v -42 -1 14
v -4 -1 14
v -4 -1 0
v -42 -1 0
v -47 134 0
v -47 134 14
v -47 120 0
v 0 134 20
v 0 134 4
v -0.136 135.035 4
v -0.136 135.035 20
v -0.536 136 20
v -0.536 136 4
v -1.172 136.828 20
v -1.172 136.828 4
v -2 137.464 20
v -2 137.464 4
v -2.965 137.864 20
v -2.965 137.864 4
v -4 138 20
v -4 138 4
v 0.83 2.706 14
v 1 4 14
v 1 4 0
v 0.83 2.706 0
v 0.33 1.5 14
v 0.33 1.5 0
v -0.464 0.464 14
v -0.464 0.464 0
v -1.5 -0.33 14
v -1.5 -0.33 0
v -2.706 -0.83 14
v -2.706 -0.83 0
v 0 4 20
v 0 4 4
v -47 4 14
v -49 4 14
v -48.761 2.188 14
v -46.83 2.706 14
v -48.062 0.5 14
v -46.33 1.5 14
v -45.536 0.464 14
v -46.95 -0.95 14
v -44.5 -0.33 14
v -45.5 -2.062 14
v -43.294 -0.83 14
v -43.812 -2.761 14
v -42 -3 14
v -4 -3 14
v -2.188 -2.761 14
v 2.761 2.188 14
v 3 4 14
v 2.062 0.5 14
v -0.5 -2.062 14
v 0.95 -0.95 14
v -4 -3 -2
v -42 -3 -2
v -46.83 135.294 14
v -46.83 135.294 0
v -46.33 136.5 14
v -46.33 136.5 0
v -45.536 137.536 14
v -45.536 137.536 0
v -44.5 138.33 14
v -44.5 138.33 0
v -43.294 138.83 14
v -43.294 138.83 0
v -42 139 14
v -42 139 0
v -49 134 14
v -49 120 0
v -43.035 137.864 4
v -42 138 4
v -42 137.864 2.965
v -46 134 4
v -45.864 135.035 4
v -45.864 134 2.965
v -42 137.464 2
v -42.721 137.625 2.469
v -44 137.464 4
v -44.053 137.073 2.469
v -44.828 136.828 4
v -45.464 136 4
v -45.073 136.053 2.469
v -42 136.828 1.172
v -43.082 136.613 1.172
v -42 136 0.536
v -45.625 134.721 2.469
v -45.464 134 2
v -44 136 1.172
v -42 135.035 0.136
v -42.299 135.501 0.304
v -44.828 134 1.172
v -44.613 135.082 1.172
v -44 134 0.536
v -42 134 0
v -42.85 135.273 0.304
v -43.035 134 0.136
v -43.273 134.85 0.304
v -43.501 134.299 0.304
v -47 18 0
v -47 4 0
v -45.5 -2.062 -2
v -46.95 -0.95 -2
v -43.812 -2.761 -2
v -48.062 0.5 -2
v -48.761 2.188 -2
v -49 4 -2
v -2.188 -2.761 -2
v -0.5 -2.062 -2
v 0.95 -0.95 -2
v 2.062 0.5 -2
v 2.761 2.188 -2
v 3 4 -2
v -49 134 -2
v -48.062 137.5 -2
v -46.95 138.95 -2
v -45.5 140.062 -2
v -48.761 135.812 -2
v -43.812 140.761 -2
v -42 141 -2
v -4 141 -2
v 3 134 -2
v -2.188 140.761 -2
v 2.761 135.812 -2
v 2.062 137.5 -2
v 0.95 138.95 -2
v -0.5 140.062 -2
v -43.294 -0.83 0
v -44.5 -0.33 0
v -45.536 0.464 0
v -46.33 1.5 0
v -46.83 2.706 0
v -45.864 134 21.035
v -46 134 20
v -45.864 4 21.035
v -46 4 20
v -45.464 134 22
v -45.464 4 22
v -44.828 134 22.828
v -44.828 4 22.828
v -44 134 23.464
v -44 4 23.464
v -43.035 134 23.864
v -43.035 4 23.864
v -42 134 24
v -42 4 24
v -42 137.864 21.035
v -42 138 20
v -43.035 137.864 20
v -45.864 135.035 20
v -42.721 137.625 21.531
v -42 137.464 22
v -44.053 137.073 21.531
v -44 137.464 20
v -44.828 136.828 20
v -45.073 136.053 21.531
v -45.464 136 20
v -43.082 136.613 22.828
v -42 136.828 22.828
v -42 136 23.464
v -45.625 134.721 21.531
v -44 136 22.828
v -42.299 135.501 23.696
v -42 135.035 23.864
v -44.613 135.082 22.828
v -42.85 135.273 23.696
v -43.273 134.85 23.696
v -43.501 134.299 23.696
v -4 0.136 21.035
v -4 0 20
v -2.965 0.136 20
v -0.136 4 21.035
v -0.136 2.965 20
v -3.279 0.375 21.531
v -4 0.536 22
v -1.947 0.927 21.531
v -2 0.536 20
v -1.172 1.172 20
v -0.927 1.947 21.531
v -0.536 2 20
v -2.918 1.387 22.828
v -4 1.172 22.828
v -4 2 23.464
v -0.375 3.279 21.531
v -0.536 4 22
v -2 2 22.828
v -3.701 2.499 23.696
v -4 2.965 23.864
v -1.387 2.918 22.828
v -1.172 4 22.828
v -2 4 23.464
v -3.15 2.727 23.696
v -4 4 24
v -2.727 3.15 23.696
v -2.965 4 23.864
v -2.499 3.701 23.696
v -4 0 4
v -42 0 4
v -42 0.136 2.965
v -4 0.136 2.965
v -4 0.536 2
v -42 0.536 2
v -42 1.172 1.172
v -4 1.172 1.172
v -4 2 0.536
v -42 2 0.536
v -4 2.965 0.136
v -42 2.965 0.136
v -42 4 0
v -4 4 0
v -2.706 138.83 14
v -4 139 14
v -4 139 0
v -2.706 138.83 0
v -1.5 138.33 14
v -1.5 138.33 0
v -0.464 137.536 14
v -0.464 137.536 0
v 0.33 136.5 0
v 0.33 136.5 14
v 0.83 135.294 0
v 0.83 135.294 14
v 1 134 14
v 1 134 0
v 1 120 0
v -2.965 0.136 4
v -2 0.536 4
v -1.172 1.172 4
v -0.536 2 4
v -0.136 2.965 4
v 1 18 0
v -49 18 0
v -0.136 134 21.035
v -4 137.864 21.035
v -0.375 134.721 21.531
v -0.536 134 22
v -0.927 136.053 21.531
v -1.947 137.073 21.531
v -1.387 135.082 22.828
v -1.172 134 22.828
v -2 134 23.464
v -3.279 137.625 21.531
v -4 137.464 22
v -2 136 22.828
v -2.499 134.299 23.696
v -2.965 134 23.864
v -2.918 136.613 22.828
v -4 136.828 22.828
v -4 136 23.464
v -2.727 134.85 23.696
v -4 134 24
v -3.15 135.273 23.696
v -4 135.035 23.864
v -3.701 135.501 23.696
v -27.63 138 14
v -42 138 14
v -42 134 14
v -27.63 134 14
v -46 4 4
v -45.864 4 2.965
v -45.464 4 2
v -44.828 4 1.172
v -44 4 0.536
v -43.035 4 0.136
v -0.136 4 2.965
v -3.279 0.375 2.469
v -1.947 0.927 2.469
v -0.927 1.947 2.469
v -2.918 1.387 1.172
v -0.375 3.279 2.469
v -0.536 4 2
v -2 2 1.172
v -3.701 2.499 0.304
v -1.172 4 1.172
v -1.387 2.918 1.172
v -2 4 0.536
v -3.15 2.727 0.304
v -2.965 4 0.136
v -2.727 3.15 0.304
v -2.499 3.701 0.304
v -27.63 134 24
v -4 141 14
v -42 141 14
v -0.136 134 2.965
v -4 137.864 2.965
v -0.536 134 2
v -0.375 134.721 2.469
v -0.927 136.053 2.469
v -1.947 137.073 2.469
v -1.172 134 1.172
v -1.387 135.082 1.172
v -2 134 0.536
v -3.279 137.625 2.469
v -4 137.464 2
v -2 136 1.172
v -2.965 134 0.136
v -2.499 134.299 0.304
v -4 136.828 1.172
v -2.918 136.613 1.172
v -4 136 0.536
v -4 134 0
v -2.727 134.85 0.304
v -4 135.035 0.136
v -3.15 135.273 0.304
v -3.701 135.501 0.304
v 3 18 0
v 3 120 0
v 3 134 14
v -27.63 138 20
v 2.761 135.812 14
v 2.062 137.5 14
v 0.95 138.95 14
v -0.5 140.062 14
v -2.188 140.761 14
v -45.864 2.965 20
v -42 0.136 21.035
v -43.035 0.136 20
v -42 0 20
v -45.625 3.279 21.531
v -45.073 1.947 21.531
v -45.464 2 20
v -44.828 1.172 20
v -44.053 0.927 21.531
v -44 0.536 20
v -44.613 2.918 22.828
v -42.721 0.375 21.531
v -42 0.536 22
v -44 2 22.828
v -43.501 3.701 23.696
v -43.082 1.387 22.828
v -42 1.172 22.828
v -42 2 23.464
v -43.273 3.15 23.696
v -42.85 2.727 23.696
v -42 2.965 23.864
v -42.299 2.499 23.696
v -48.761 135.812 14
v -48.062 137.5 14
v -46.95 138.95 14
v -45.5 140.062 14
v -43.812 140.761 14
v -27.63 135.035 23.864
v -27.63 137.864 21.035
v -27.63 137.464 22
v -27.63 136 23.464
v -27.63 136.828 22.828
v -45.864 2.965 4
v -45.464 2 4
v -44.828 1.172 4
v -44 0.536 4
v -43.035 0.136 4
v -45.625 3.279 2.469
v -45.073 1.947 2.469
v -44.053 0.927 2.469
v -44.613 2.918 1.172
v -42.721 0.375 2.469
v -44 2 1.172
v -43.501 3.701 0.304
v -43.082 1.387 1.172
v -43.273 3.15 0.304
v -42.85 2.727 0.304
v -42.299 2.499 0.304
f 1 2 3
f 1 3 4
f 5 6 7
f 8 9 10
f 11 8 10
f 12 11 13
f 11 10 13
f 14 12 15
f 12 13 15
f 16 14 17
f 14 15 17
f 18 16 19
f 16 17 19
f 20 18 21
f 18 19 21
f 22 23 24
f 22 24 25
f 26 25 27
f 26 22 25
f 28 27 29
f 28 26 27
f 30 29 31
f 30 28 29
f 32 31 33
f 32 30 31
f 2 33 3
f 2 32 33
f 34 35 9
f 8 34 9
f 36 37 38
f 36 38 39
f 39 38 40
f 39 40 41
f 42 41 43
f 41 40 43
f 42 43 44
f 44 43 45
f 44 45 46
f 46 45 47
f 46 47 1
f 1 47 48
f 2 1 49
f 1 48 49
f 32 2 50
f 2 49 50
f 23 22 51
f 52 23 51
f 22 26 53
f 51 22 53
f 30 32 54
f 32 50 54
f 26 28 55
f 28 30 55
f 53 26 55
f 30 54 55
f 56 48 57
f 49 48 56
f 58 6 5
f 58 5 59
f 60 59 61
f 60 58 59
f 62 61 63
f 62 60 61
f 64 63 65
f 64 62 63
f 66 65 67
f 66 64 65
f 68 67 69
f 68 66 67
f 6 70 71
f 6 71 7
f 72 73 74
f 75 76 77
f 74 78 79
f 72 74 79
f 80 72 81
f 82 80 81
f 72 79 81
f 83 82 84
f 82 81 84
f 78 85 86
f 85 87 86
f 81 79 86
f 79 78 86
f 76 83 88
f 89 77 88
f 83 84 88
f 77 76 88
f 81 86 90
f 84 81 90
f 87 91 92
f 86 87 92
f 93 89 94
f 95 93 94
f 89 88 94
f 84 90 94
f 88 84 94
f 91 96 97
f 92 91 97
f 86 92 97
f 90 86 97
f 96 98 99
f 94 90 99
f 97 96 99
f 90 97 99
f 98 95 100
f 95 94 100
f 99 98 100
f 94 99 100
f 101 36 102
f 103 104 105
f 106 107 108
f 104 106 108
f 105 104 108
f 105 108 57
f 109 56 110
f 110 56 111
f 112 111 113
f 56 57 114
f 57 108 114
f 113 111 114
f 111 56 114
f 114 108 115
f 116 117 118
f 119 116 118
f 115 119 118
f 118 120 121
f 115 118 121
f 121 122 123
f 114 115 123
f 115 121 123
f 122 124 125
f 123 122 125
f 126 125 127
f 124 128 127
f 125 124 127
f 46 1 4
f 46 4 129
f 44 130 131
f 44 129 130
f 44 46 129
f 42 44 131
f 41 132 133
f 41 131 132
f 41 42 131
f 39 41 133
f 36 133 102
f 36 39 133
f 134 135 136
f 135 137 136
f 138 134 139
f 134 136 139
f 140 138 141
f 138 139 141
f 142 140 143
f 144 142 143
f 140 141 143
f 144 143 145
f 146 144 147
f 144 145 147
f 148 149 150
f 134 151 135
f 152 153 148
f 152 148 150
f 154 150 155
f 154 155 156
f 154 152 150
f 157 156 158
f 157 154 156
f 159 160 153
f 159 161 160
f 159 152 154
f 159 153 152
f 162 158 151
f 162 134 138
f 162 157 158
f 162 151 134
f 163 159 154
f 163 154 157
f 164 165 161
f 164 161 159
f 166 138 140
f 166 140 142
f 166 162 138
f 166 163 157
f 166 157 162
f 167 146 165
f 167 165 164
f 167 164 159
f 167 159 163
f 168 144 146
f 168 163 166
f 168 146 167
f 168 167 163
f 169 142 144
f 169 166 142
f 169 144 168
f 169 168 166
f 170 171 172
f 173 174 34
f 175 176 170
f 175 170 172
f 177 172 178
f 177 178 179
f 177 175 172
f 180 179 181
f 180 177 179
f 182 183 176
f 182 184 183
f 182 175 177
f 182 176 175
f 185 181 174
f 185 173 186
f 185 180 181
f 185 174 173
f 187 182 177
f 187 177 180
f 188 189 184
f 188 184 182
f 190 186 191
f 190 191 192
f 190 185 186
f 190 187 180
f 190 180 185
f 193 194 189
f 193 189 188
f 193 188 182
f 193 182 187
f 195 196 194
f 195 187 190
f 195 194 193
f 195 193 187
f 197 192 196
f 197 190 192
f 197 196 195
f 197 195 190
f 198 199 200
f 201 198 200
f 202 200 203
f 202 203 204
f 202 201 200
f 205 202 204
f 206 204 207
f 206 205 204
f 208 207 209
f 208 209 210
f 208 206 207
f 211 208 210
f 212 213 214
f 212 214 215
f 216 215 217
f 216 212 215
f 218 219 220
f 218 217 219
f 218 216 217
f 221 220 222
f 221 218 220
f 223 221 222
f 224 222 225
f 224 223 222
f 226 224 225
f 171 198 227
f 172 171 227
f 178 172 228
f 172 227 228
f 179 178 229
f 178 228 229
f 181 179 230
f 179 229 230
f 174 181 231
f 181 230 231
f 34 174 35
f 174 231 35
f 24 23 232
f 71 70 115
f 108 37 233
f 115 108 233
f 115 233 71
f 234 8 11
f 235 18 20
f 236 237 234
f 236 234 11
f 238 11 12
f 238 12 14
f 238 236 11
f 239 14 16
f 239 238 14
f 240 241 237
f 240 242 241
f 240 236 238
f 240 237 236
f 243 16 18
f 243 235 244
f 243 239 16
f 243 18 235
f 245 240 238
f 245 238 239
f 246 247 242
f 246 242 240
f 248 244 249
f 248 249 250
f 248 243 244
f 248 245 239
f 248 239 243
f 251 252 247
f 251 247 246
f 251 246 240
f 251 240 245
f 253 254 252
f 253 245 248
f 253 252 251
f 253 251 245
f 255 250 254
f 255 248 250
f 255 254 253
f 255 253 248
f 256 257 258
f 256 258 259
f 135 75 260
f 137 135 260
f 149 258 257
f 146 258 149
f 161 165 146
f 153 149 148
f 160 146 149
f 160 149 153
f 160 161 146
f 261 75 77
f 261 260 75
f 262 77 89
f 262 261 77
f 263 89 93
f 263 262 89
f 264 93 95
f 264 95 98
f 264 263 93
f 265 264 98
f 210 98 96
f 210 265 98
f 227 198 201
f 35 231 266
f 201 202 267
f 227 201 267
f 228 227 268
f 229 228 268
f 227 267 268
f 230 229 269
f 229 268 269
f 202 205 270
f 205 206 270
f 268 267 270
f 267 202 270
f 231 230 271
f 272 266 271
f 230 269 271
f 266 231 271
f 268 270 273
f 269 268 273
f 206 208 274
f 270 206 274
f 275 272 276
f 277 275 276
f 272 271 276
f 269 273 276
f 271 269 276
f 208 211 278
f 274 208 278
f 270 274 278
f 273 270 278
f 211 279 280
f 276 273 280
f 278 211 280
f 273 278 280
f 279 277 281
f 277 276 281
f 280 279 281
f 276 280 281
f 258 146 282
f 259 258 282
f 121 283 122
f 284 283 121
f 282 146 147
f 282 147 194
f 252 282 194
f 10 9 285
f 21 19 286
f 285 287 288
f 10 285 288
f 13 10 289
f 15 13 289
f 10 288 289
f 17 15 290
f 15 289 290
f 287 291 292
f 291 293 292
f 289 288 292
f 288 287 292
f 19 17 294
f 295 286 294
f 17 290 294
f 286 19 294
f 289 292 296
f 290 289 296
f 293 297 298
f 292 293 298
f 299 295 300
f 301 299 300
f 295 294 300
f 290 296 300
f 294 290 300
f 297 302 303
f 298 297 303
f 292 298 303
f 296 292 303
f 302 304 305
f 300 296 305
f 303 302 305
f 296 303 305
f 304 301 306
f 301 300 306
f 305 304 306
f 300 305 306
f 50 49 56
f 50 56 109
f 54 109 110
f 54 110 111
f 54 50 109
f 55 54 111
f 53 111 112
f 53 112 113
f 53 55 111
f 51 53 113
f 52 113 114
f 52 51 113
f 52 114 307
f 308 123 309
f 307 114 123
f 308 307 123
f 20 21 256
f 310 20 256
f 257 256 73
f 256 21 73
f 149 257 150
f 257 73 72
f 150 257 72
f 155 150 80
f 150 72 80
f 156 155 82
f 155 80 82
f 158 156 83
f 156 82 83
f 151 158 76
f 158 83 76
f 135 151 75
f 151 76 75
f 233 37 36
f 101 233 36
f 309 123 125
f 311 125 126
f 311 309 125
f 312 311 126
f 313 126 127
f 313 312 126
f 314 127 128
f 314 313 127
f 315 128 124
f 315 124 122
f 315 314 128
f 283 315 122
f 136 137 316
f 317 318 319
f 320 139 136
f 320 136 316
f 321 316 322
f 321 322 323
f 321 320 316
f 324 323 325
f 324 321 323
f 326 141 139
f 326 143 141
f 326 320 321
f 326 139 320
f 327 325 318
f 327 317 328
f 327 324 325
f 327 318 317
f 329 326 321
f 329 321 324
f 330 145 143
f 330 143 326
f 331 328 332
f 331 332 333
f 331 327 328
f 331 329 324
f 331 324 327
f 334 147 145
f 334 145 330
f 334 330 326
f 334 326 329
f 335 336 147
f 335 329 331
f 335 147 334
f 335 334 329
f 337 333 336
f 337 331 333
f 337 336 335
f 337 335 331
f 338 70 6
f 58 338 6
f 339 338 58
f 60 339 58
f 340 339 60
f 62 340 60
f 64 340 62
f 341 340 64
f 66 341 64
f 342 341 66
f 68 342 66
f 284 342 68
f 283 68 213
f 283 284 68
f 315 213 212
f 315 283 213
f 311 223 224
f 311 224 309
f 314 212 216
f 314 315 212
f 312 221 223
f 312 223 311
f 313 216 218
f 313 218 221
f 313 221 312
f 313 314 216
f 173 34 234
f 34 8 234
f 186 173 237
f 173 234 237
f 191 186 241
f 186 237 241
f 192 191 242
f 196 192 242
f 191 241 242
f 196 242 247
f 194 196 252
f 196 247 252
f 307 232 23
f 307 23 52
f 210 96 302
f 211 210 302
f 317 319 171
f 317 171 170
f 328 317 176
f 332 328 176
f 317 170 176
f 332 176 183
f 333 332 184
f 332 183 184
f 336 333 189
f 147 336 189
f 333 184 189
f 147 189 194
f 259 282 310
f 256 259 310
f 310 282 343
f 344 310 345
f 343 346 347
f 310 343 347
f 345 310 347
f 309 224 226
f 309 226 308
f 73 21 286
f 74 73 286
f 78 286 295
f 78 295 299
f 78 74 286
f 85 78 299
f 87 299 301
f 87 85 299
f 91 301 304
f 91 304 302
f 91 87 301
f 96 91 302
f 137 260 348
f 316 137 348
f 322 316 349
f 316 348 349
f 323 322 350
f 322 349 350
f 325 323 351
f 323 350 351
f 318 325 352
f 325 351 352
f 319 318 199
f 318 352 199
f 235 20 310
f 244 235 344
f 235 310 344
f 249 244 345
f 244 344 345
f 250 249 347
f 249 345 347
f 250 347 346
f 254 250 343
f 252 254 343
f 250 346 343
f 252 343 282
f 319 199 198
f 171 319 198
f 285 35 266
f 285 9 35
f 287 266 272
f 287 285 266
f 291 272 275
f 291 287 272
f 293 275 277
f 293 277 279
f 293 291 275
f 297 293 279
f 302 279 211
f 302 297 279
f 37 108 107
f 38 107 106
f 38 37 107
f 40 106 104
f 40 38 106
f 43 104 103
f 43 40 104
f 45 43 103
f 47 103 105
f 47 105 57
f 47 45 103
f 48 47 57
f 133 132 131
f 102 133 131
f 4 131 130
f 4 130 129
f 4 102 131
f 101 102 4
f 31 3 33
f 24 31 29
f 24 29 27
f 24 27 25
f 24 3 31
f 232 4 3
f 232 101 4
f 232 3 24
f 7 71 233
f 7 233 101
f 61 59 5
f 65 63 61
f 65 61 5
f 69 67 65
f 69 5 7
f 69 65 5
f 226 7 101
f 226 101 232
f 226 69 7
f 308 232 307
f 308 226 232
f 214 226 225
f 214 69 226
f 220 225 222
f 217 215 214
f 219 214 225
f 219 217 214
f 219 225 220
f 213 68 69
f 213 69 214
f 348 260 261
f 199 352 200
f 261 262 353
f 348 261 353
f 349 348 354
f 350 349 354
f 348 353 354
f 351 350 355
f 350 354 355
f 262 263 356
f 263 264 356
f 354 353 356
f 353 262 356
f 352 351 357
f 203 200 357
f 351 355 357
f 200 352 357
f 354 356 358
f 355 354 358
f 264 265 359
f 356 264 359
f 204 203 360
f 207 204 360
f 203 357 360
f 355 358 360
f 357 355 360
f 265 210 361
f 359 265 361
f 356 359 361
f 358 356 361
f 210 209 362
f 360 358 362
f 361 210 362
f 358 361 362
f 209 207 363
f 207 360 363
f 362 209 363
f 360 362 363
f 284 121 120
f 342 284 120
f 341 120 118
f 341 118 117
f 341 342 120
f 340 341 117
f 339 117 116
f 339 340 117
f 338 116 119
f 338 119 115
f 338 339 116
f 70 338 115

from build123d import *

# Parameters (mm, degrees)
F1_DEPTH  = 24
F2_R      = 4
F3_W      = 14.3697379231
F3_H      = 4.1815820932
F4_DEPTH  = 10
F5_DEPTH  = 14
F6_DEPTH  = 2
F7_DEPTH  = 2
F8_W      = 2
F8_H      = 130
F9_DEPTH  = 14
F10_DEPTH = 14
F11_DEPTH = 14
F12_SIZE  = 13.99999


# Not quite as in the source:
# - a fillet or chamfer is up to 0.001 mm smaller than in the source, because OpenCascade refuses the exact size


with BuildPart() as f1:
    # F0 (on Top) → F1 (new body)
    with BuildSketch(Plane.XY):
        with BuildLine():
            Line((-42, 0), (-4, 0))
            ThreePointArc((-4, 0), (-1.1715728753, 1.1715728753), (0, 4))
            Line((0, 4), (0, 134))
            ThreePointArc((0, 134), (-1.1715728753, 136.8284271247), (-4, 138))
            Line((-4, 138), (-42, 138))
            ThreePointArc((-42, 138), (-44.8284271247, 136.8284271247), (-46, 134))
            Line((-46, 134), (-46, 4))
            ThreePointArc((-46, 4), (-44.8284271247, 1.1715728753), (-42, 0))
        make_face()
    extrude(amount=F1_DEPTH)

    # F2
    f2_edges = [f1.edges().sort_by_distance(p)[0] for p in [
        (-46, 69, 24),
        (-44.828427, 1.171573, 24),
        (-23, 0, 24),
        (-1.171573, 1.171573, 24),
        (0, 69, 24),
        (-1.171573, 136.828427, 24),
        (-23, 138, 24),
        (-44.828427, 136.828427, 24),
        (-46, 69, 0),
        (-44.828427, 1.171573, 0),
        (-23, 0, 0),
        (-1.171573, 1.171573, 0),
        (0, 69, 0),
        (-1.171573, 136.828427, 0),
        (-23, 138, 0),
        (-44.828427, 136.828427, 0),
    ]]
    fillet(f2_edges, radius=F2_R)

    # F3 (on face) → F4 (cut)
    with BuildSketch(Plane.XY.offset(24)):
        with Locations((-34.8151310384, 136.0907910466)):
            Rectangle(F3_W, F3_H)
    extrude(amount=-F4_DEPTH, mode=Mode.SUBTRACT)


with BuildPart() as f5:
    # F0 (on Top) → F5 (new body)
    with BuildSketch(Plane.XY):
        with BuildLine():
            Line((-42, -3), (-4, -3))
            ThreePointArc((-4, -3), (0.9497474683, -0.9497474683), (3, 4))
            Line((3, 4), (3, 134))
            ThreePointArc((3, 134), (0.9497474683, 138.9497474683), (-4, 141))
            Line((-4, 141), (-42, 141))
            ThreePointArc((-42, 141), (-46.9497474683, 138.9497474683), (-49, 134))
            Line((-49, 134), (-49, 4))
            ThreePointArc((-49, 4), (-46.9497474683, -0.9497474683), (-42, -3))
        make_face()
        with BuildLine():
            ThreePointArc((-42, -1), (-45.5355339059, 0.4644660941), (-47, 4))
            Line((-47, 4), (-47, 134))
            ThreePointArc((-47, 134), (-45.5355339059, 137.5355339059), (-42, 139))
            Line((-42, 139), (-4, 139))
            ThreePointArc((-4, 139), (-0.4644660941, 137.5355339059), (1, 134))
            Line((1, 134), (1, 4))
            ThreePointArc((1, 4), (-0.4644660941, 0.4644660941), (-4, -1))
            Line((-4, -1), (-42, -1))
        make_face(mode=Mode.SUBTRACT)
    extrude(amount=F5_DEPTH)



with BuildPart() as f6:
    # F0 (on Top) → F6 (new body)
    with BuildSketch(Plane.XY):
        with BuildLine():
            Line((-42, -3), (-4, -3))
            ThreePointArc((-4, -3), (0.9497474683, -0.9497474683), (3, 4))
            Line((3, 4), (3, 134))
            ThreePointArc((3, 134), (0.9497474683, 138.9497474683), (-4, 141))
            Line((-4, 141), (-42, 141))
            ThreePointArc((-42, 141), (-46.9497474683, 138.9497474683), (-49, 134))
            Line((-49, 134), (-49, 4))
            ThreePointArc((-49, 4), (-46.9497474683, -0.9497474683), (-42, -3))
        make_face()
        with BuildLine():
            ThreePointArc((-42, -1), (-45.5355339059, 0.4644660941), (-47, 4))
            Line((-47, 4), (-47, 134))
            ThreePointArc((-47, 134), (-45.5355339059, 137.5355339059), (-42, 139))
            Line((-42, 139), (-4, 139))
            ThreePointArc((-4, 139), (-0.4644660941, 137.5355339059), (1, 134))
            Line((1, 134), (1, 4))
            ThreePointArc((1, 4), (-0.4644660941, 0.4644660941), (-4, -1))
            Line((-4, -1), (-42, -1))
        make_face(mode=Mode.SUBTRACT)
    extrude(amount=-F6_DEPTH)


with BuildPart() as f6b:
    # F0 (on Top) → F6, piece 2 (new body)
    with BuildSketch(Plane.XY):
        with BuildLine():
            Line((-42, 0), (-4, 0))
            ThreePointArc((-4, 0), (-1.1715728753, 1.1715728753), (0, 4))
            Line((0, 4), (0, 134))
            ThreePointArc((0, 134), (-1.1715728753, 136.8284271247), (-4, 138))
            Line((-4, 138), (-42, 138))
            ThreePointArc((-42, 138), (-44.8284271247, 136.8284271247), (-46, 134))
            Line((-46, 134), (-46, 4))
            ThreePointArc((-46, 4), (-44.8284271247, 1.1715728753), (-42, 0))
        make_face()
    extrude(amount=-F6_DEPTH)


with BuildPart() as f5_1:
    add(f5.part)

    add(f6.part)  # F7 merges F6

    add(f6b.part)  # F7 merges F6b
    # F0 (on Top) → F7 (join)
    with BuildSketch(Plane.XY):
        with BuildLine():
            Line((-47, 134), (-47, 4))
            ThreePointArc((-47, 4), (-45.5355339059, 0.4644660941), (-42, -1))
            Line((-42, -1), (-4, -1))
            ThreePointArc((-4, -1), (-0.4644660941, 0.4644660941), (1, 4))
            Line((1, 4), (1, 134))
            ThreePointArc((1, 134), (-0.4644660941, 137.5355339059), (-4, 139))
            Line((-4, 139), (-42, 139))
            ThreePointArc((-42, 139), (-45.5355339059, 137.5355339059), (-47, 134))
        make_face()
        with BuildLine():
            ThreePointArc((0, 4), (-1.1715728753, 1.1715728753), (-4, 0))
            Line((-4, 0), (-42, 0))
            ThreePointArc((-42, 0), (-44.8284271247, 1.1715728753), (-46, 4))
            Line((-46, 4), (-46, 134))
            ThreePointArc((-46, 134), (-44.8284271247, 136.8284271247), (-42, 138))
            Line((-42, 138), (-4, 138))
            ThreePointArc((-4, 138), (-1.1715728753, 136.8284271247), (0, 134))
            Line((0, 134), (0, 4))
        make_face(mode=Mode.SUBTRACT)
    extrude(amount=-F7_DEPTH)

    # F8 (on face) → F9 (cut)
    with BuildSketch(Plane.XY.offset(14)):
        with Locations((-48, 69)):
            Rectangle(F8_W, F8_H)
        with Locations((2, 69)):
            Rectangle(F8_W, F8_H)
    extrude(amount=-F9_DEPTH, mode=Mode.SUBTRACT)

    # F10 (add): faces of the model
    f10_faces = [f5_1.faces().sort_by_distance(p)[0] for p in [
        (-48, 4, 7),
        (2, 4, 7),
    ]]
    extrude(f10_faces, amount=F10_DEPTH)

    # F11 (add): faces of the model
    f11_faces = [f5_1.faces().sort_by_distance(p)[0] for p in [
        (2, 134, 7),
        (-48, 134, 7),
    ]]
    extrude(f11_faces, amount=F11_DEPTH)

    # F12 (size 14 in the source; OpenCascade refuses exactly that, so slightly less here)
    f12_edges = [f5_1.edges().sort_by_distance(p)[0] for p in [
        (-48, 120, 14),
        (2, 120, 14),
        (2, 18, 14),
        (-48, 18, 14),
    ]]
    chamfer(f12_edges, length=F12_SIZE)


solid = Compound([f1.part, f5_1.part])
